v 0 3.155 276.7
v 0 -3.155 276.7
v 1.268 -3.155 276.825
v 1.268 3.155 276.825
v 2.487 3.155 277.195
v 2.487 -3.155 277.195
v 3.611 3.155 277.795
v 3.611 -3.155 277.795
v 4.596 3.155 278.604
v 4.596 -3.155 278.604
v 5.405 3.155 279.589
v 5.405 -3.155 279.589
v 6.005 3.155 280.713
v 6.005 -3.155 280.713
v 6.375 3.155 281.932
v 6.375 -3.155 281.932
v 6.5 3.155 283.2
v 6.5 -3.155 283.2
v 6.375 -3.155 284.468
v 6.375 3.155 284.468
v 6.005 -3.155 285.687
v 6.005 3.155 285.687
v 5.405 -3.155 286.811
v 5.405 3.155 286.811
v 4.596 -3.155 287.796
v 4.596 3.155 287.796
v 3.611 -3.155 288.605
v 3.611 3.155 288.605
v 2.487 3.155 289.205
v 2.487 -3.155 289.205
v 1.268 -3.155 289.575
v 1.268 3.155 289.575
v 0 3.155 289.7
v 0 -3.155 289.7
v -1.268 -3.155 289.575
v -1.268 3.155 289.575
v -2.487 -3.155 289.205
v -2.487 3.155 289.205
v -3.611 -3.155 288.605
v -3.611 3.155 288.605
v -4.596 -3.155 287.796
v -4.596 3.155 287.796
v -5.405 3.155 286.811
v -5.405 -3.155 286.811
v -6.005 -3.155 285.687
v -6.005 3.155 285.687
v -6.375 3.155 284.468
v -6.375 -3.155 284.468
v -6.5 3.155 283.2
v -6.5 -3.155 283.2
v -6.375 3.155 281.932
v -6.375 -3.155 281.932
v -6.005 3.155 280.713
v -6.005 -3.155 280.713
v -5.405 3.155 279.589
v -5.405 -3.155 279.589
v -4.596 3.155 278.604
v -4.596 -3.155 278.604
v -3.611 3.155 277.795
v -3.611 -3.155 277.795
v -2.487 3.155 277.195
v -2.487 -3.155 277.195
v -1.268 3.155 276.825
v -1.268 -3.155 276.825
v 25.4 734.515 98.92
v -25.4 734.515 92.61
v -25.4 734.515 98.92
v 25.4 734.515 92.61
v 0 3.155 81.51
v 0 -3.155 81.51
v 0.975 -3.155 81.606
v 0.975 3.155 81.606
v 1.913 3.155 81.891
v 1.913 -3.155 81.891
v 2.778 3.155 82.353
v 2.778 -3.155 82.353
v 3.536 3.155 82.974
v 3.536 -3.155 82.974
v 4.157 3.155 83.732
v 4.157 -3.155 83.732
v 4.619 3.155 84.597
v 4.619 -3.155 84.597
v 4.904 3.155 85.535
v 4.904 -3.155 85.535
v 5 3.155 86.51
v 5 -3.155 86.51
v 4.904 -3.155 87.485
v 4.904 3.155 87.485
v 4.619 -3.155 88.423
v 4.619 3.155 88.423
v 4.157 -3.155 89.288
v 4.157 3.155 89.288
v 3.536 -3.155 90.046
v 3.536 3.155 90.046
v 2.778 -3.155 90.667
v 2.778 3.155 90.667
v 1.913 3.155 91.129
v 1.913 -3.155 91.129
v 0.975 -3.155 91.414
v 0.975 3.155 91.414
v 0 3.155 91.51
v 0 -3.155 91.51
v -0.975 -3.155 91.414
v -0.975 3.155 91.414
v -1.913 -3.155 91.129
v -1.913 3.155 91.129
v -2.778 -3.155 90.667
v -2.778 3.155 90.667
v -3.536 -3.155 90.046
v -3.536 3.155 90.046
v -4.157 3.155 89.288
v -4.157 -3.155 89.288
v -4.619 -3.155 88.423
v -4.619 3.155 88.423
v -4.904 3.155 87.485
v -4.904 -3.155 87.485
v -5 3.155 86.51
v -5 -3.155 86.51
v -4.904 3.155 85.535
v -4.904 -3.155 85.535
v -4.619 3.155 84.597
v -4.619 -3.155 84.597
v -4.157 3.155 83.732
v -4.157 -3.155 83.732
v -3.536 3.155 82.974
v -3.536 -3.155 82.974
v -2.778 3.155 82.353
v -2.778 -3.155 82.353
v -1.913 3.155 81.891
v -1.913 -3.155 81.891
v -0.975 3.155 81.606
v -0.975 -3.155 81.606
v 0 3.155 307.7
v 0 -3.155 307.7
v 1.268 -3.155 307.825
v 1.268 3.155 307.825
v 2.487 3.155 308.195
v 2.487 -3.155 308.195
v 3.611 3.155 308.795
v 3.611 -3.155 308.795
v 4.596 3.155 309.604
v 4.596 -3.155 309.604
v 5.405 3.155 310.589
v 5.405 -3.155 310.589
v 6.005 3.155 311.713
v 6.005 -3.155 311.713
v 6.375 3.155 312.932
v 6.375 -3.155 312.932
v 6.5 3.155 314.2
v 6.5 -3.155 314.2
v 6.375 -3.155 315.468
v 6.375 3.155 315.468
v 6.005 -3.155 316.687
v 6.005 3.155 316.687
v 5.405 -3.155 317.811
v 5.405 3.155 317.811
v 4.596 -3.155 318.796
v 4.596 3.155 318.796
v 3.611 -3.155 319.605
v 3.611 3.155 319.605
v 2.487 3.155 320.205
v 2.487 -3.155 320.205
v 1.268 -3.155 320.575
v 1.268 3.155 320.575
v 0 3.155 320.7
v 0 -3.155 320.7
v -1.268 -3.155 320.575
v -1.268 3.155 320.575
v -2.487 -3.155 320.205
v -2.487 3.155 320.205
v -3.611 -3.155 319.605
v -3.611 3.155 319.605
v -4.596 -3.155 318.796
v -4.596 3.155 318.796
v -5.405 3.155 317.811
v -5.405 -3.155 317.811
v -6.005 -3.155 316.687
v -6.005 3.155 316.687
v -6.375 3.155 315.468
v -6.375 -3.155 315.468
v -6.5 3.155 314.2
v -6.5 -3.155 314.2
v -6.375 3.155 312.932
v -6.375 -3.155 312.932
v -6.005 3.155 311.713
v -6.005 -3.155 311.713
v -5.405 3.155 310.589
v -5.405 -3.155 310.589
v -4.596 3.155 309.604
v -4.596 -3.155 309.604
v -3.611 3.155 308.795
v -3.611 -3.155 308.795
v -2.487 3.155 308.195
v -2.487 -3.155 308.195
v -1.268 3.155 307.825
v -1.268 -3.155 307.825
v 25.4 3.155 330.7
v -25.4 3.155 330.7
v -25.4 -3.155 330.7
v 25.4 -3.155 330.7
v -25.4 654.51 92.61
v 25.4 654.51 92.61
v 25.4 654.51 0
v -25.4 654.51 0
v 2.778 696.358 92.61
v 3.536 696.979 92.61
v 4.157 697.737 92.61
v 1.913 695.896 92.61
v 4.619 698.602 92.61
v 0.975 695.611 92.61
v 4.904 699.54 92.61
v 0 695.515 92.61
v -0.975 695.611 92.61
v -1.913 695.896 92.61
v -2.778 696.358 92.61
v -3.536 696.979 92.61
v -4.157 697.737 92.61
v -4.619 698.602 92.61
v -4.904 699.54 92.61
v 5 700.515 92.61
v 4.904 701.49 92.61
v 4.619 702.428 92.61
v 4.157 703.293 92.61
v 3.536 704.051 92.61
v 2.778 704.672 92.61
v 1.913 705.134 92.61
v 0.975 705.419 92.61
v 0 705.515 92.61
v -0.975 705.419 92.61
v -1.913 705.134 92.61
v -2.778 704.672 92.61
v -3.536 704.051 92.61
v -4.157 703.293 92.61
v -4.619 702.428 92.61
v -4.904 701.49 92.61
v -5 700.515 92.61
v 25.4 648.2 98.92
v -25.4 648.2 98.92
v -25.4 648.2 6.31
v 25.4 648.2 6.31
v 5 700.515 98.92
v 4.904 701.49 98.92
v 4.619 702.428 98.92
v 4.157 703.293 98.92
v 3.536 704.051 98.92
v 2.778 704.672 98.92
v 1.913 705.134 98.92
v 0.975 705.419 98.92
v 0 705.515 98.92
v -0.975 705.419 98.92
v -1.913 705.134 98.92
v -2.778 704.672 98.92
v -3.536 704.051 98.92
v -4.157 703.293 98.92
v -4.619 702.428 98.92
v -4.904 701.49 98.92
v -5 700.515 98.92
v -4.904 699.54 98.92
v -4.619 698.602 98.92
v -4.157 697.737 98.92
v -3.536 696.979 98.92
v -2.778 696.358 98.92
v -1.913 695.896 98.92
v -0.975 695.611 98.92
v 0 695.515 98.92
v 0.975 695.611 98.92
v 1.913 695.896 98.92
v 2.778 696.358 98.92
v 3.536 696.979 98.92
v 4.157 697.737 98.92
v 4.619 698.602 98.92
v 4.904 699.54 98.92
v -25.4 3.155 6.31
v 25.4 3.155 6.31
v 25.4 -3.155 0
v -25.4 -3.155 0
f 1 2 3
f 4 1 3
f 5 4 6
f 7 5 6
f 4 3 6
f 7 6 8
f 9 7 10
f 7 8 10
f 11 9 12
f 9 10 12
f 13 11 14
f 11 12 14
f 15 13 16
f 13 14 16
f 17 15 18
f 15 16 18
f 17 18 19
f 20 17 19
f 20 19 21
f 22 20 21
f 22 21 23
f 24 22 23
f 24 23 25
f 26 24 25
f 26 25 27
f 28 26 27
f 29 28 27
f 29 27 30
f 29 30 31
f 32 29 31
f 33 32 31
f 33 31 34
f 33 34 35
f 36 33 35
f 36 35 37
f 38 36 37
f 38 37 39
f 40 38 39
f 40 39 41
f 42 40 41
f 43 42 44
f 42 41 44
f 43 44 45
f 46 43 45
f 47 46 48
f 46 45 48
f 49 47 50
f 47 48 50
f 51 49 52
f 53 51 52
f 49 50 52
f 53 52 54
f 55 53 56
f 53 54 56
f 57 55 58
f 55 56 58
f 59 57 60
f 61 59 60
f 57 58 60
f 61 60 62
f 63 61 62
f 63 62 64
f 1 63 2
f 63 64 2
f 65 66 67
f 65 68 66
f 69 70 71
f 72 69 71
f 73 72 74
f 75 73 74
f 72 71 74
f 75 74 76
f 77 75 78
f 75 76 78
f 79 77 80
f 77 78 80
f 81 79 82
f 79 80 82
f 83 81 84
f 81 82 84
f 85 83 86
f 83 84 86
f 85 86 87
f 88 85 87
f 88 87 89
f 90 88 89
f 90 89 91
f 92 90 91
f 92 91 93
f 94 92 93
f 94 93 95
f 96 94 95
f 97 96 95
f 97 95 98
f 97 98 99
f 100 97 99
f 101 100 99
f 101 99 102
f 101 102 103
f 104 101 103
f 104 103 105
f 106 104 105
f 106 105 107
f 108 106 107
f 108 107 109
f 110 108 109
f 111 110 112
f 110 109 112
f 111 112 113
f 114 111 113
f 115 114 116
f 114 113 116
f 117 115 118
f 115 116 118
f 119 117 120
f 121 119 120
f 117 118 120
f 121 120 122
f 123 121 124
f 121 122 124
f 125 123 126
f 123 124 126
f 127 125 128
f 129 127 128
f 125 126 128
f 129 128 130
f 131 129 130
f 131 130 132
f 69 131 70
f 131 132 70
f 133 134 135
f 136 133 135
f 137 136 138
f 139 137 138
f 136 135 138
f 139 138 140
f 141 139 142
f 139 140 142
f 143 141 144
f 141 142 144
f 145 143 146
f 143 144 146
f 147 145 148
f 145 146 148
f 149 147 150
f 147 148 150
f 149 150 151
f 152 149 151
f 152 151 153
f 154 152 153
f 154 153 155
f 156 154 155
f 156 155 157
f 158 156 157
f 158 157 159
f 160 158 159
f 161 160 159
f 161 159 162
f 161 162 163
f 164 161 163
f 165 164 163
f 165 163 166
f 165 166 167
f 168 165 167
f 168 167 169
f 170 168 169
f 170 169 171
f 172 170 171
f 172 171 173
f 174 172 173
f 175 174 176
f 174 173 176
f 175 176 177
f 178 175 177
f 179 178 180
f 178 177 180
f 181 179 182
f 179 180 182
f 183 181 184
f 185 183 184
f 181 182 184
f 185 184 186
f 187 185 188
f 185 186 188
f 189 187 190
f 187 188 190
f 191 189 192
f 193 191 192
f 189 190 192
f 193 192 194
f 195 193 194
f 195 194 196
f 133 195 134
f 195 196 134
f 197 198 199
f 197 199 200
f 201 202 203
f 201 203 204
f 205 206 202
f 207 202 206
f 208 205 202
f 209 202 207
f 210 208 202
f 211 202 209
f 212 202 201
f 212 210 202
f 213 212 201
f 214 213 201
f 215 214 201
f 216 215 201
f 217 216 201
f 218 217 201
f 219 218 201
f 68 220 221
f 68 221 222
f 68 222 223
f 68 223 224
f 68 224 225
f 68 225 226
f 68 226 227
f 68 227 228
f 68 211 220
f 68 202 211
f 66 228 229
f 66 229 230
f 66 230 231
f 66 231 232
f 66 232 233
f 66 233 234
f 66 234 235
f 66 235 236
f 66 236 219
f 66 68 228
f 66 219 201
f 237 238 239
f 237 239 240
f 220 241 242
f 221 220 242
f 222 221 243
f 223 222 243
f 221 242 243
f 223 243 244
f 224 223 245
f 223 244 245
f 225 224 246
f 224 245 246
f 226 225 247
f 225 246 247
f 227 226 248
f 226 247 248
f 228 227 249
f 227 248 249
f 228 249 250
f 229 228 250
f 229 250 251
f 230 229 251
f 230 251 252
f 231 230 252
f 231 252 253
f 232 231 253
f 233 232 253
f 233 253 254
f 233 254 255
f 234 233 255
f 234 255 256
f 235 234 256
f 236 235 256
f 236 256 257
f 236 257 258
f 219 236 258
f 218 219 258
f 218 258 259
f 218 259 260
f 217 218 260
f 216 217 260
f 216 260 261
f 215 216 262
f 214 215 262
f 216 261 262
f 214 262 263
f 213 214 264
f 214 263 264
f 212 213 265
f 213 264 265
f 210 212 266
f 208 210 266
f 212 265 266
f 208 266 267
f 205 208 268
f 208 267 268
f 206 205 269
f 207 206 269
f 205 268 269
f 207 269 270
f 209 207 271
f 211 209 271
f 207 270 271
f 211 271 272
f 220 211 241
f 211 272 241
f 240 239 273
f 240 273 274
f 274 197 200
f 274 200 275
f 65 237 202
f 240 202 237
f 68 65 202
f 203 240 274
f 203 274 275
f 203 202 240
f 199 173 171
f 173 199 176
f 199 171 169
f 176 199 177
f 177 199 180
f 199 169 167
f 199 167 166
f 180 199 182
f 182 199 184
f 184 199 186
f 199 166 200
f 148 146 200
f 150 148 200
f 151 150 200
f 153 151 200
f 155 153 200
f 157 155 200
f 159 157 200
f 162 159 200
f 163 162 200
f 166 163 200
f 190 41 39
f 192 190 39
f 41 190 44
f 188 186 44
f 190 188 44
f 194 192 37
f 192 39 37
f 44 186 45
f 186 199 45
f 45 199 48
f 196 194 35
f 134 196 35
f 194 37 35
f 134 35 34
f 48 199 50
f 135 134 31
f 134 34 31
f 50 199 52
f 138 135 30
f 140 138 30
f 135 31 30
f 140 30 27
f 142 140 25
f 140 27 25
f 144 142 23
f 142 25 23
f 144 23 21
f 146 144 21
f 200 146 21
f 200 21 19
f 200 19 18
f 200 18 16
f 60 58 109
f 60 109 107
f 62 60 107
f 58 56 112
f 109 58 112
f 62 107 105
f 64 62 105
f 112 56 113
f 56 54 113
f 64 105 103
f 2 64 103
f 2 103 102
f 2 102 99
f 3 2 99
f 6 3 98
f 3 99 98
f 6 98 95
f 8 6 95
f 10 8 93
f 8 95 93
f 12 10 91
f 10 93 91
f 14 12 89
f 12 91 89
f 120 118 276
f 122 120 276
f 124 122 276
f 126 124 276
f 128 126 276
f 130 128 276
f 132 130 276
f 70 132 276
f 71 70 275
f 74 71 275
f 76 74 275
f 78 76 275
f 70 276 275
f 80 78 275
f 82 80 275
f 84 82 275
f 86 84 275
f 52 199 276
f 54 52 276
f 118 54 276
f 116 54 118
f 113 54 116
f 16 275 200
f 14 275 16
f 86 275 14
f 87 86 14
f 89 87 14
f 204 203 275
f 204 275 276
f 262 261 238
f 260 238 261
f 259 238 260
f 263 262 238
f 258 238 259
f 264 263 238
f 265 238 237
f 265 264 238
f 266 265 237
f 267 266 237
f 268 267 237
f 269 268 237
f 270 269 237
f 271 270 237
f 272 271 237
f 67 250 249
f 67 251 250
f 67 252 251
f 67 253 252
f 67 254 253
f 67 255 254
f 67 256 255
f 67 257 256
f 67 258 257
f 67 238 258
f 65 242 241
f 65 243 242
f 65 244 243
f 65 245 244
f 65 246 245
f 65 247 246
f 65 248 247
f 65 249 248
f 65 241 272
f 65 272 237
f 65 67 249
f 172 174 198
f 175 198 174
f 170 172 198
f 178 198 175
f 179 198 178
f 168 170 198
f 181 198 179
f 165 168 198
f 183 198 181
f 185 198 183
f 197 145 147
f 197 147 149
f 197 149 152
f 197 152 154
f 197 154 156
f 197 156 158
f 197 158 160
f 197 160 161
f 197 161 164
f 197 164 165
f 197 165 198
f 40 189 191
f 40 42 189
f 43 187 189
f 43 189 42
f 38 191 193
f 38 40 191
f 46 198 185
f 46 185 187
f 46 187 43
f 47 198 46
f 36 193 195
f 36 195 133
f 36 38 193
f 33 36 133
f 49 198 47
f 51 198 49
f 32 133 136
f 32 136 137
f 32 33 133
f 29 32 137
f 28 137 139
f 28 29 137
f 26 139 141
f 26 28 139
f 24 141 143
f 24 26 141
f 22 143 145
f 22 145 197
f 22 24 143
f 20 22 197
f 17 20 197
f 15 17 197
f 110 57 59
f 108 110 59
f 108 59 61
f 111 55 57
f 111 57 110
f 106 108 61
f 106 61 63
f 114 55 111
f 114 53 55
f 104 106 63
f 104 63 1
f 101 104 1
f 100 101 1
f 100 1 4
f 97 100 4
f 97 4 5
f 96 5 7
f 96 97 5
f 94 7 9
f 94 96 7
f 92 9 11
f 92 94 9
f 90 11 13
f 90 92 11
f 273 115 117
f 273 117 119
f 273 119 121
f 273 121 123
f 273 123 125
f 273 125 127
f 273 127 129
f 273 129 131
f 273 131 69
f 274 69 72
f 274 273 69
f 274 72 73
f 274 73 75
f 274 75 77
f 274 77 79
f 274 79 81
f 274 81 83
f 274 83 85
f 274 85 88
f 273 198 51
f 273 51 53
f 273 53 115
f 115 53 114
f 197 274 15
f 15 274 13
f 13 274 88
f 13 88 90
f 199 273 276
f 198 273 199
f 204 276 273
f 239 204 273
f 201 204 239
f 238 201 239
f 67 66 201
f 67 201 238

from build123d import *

# Parameters (mm, degrees)
CROQUIS1_W              = 50.8
CROQUIS1_H              = 6.31
SALIENTE_EXTRUIR1_DEPTH = 330.7
CROQUIS3_W              = 50.8
CROQUIS3_H              = 6.31
SALIENTE_EXTRUIR2_DEPTH = 644.51
CROQUIS4_W              = 50.8
CROQUIS4_H              = 6.31
CROQUIS8_R              = 6.5
CORTAR_EXTRUIR2_DEPTH   = 10
CROQUIS10_R             = 5
CORTAR_EXTRUIR4_DEPTH   = 50
CROQUIS11_R             = 5
CORTAR_EXTRUIR5_DEPTH   = 10


with BuildPart() as part:
    # Croquis1 → Saliente-Extruir1 (new body)
    with BuildSketch(Plane.XY):
        Rectangle(CROQUIS1_W, CROQUIS1_H)
    extrude(amount=SALIENTE_EXTRUIR1_DEPTH)

    # Croquis3 → Saliente-Extruir2 (add)
    with BuildSketch(Plane.XZ.offset(3.155)):
        with Locations((0, 3.155)):
            Rectangle(CROQUIS3_W, CROQUIS3_H)
    extrude(amount=-SALIENTE_EXTRUIR2_DEPTH)

    # Barrer1: sweep along a curve in space
    with BuildLine() as barrer1_path:
        Line((0, 641.355, 3.155), (0, 651.355, 3.155))
        Line((0, 651.355, 3.155), (0, 651.355, 95.765))
        Line((0, 651.355, 95.765), (0, 734.515, 95.765))
    # Croquis4 → Barrer1 (sweep)
    with BuildSketch(Plane(origin=(0, 641.355, 0), x_dir=(1, 0, 0), z_dir=(0, 1, 0))):
        with Locations((0, -3.155)):
            Rectangle(CROQUIS4_W, CROQUIS4_H)
    sweep(path=barrer1_path.line, transition=Transition.RIGHT)

    # Croquis8 → Cortar-Extruir2 (cut)
    with BuildSketch(Plane.XZ.offset(3.155)):
        with Locations(Location((0, 314.2, 0), (0, 0, 270))):
            Circle(CROQUIS8_R)
        with Locations(Location((0, 283.2, 0), (0, 0, 270))):
            Circle(CROQUIS8_R)
    extrude(amount=-CORTAR_EXTRUIR2_DEPTH, mode=Mode.SUBTRACT)

    # Croquis10 → Cortar-Extruir4 (cut)
    with BuildSketch(Plane.XY.offset(98.92)):
        with Locations((0, 700.515)):
            Circle(CROQUIS10_R)
    extrude(amount=-CORTAR_EXTRUIR4_DEPTH, mode=Mode.SUBTRACT)

    # Croquis11 → Cortar-Extruir5 (cut)
    with BuildSketch(Plane.XZ.offset(3.155)):
        with Locations(Location((0, 86.51, 0), (0, 0, 270))):
            Circle(CROQUIS11_R)
    extrude(amount=-CORTAR_EXTRUIR5_DEPTH, mode=Mode.SUBTRACT)


solid = part.part
